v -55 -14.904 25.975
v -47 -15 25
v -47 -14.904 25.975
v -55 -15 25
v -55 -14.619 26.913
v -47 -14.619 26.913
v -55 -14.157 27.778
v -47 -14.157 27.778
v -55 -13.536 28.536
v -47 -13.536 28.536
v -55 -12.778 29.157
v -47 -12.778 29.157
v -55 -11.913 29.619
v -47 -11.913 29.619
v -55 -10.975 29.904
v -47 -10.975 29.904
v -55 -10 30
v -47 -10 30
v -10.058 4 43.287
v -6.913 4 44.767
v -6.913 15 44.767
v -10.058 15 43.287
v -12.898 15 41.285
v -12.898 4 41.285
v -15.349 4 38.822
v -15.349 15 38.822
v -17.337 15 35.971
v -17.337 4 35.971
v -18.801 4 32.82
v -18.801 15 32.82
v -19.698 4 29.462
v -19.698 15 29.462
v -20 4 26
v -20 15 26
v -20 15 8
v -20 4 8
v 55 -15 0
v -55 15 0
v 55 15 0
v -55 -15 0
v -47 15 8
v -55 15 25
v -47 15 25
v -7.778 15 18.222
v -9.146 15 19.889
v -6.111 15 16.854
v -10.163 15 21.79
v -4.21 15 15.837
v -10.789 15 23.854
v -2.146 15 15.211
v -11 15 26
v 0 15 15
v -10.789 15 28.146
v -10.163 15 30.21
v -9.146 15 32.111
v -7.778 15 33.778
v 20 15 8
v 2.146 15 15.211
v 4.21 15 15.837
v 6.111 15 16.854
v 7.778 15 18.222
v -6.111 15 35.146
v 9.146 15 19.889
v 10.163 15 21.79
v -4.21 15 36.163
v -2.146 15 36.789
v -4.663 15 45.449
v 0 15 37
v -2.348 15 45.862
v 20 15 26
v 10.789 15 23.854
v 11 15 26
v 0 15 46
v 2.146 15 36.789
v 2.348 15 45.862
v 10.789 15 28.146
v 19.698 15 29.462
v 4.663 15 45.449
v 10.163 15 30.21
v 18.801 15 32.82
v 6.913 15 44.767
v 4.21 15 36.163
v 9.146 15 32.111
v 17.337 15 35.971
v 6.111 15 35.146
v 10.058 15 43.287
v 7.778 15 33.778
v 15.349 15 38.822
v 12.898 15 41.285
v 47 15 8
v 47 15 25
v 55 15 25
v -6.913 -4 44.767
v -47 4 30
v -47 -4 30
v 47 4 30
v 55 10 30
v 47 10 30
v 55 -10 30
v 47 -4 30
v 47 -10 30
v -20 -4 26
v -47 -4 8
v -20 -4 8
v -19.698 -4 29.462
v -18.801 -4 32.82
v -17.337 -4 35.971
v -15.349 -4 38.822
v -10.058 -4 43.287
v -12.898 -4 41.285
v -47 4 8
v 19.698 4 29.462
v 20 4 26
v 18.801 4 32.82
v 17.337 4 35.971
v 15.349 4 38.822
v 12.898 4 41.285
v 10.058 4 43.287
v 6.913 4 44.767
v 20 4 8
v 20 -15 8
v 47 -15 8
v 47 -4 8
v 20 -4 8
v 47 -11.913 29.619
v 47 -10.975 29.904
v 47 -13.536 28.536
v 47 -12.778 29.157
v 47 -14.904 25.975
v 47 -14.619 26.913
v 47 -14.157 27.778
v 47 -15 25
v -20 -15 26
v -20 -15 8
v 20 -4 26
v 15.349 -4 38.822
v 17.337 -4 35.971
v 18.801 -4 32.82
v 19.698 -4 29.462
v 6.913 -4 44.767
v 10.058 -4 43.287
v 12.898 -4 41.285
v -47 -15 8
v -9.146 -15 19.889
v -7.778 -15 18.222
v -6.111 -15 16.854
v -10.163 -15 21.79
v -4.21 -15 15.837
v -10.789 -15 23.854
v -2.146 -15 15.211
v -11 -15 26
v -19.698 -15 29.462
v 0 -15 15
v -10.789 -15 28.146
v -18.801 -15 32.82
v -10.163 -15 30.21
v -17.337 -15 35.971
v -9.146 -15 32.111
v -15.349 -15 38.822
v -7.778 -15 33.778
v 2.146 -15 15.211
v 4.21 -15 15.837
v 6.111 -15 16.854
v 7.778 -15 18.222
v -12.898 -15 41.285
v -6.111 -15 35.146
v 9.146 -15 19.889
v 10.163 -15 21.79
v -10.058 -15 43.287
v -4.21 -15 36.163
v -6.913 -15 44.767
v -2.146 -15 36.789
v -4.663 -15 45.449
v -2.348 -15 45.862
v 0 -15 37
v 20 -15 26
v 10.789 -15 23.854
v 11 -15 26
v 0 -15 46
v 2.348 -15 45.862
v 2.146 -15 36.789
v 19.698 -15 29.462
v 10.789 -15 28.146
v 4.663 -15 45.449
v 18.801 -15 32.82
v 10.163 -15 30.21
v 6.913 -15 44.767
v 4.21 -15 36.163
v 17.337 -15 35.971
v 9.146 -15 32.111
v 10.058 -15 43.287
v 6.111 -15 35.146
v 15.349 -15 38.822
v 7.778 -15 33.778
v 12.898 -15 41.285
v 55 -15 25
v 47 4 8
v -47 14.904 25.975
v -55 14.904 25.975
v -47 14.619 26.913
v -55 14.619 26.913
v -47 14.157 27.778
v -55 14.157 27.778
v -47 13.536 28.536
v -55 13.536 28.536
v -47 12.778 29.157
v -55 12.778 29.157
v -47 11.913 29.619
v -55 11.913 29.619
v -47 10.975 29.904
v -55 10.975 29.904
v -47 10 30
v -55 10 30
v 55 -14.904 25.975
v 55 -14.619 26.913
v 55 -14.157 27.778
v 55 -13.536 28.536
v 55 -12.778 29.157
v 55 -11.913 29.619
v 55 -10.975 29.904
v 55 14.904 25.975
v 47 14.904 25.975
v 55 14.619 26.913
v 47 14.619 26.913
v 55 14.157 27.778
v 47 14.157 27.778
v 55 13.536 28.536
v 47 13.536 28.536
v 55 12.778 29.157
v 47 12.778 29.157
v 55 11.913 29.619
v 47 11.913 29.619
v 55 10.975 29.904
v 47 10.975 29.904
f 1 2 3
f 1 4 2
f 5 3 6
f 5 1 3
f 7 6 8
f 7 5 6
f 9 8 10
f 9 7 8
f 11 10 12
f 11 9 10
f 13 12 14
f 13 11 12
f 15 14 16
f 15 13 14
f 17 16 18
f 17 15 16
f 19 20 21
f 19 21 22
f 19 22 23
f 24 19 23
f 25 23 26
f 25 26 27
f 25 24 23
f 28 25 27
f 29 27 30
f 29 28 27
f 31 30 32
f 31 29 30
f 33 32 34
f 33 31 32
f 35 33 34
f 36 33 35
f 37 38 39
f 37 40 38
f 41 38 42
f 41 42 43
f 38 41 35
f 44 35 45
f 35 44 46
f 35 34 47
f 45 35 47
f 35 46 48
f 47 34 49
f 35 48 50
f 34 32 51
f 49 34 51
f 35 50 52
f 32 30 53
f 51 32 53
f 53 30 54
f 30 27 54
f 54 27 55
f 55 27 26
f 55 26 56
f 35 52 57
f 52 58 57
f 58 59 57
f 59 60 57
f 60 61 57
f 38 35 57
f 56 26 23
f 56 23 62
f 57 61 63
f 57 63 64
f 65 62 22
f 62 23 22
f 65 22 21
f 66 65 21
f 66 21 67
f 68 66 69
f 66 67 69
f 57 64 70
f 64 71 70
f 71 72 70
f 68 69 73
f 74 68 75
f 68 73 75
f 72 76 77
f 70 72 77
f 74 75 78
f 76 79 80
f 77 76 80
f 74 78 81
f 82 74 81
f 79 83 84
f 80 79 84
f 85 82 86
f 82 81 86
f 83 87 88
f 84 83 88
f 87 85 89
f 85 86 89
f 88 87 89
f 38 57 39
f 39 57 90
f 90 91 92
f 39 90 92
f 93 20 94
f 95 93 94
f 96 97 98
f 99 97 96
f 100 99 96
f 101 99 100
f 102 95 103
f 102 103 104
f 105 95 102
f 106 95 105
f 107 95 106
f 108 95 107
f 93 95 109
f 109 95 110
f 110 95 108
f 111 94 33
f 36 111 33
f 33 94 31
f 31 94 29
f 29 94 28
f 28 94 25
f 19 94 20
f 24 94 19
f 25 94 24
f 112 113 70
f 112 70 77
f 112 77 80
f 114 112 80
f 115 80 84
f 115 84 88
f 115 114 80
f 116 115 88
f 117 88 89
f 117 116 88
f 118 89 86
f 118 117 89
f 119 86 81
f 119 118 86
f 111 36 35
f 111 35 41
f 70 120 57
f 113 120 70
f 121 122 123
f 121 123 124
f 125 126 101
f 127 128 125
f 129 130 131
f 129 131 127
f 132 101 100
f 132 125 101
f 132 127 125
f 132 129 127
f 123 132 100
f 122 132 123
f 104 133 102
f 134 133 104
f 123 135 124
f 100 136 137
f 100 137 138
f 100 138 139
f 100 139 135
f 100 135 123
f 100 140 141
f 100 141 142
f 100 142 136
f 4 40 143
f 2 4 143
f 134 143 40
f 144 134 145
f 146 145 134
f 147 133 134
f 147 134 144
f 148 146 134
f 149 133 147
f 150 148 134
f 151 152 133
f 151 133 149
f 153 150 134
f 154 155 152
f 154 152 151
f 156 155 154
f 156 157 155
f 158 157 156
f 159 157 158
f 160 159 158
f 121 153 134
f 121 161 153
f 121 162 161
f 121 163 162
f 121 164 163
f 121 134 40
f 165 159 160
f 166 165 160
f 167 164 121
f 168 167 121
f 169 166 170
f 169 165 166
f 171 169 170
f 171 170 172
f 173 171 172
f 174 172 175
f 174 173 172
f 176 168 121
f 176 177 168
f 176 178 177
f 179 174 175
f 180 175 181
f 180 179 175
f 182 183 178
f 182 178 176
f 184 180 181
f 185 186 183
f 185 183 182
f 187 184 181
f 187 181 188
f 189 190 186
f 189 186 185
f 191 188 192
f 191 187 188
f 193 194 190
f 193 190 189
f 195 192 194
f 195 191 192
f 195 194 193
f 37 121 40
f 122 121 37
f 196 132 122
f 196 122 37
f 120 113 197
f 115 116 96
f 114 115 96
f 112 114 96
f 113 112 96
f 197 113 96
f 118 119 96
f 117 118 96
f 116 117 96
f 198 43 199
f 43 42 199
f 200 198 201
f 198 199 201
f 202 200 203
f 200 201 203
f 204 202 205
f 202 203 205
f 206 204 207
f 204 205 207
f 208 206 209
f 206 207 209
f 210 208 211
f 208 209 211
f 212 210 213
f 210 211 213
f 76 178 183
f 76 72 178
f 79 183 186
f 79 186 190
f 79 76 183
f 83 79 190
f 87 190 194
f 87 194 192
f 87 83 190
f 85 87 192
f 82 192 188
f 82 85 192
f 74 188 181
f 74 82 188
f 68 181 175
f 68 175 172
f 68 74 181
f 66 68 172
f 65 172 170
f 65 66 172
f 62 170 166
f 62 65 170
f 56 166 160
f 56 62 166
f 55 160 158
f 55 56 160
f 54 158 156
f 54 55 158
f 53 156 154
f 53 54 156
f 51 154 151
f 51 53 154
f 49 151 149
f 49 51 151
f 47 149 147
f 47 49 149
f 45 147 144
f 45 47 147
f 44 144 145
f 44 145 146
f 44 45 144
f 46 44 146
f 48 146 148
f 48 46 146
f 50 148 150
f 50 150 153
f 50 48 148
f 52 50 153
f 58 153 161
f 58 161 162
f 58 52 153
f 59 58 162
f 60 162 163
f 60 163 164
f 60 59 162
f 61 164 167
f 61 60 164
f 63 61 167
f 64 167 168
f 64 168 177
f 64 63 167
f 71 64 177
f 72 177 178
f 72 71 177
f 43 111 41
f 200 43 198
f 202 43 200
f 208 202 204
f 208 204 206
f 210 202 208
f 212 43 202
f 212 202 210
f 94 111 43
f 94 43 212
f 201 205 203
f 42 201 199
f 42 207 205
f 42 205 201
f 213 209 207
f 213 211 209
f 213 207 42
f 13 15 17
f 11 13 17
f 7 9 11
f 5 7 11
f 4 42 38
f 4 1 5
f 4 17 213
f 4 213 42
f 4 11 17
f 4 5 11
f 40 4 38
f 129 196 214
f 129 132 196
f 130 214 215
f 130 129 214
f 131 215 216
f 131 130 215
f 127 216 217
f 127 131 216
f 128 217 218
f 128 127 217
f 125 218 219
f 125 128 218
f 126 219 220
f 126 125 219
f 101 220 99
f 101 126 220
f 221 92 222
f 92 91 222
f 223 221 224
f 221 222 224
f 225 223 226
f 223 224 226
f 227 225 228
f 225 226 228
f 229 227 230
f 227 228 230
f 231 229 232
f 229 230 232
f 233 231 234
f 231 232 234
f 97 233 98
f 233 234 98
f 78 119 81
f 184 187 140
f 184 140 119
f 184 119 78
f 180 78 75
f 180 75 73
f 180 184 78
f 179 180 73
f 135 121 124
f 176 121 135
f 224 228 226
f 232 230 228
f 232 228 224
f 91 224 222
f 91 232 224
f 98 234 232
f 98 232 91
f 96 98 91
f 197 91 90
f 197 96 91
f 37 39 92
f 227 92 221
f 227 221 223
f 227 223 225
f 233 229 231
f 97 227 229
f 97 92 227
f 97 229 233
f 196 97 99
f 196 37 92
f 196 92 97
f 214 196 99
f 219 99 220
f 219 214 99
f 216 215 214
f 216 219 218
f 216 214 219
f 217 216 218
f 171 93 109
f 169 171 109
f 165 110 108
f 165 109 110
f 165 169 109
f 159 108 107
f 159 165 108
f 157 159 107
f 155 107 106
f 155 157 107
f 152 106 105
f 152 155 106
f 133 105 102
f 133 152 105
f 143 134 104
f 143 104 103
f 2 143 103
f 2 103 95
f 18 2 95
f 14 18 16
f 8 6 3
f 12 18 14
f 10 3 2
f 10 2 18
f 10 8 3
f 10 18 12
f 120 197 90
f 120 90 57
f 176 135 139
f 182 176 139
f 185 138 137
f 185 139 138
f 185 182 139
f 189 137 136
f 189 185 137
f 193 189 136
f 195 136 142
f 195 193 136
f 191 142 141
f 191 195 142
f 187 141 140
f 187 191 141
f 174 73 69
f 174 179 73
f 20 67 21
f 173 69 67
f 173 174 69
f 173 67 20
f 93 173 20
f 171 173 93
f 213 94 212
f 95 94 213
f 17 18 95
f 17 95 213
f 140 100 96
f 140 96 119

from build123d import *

# Parameters (mm, degrees)
F0_R     = 11
F1_DEPTH = 15
F2_DEPTH = 4
F3_R     = 5


with BuildPart() as f1:
    # F0 (on Front) → F1 (new body, symmetric)
    with BuildSketch(Plane.XZ):
        with BuildLine():
            Line((-55, 0), (0, 0))
            Line((0, 0), (55, 0))
            Line((55, 0), (55, 30))
            Line((55, 30), (47, 30))
            Line((47, 30), (47, 8))
            Line((47, 8), (20, 8))
            Line((20, 8), (20, 26))
            ThreePointArc((20, 26), (16.405315, 37.439651), (6.913438, 44.767109))
            ThreePointArc((6.913438, 44.767109), (3.511255, 45.689365), (0, 46))
            ThreePointArc((0, 46), (-3.511255, 45.689365), (-6.913438, 44.767109))
            ThreePointArc((-6.913438, 44.767109), (-16.405315, 37.439651), (-20, 26))
            Line((-20, 26), (-20, 8))
            Line((-20, 8), (-47, 8))
            Line((-47, 8), (-47, 30))
            Line((-47, 30), (-55, 30))
            Line((-55, 30), (-55, 0))
        make_face()
        with Locations((0, 26)):
            Circle(F0_R, mode=Mode.SUBTRACT)
    extrude(amount=F1_DEPTH, both=True)

    # F0 (on Front) → F2 (join, symmetric)
    with BuildSketch(Plane.XZ):
        with BuildLine():
            Line((-6.913438, 44.767109), (-47, 30))
            Line((-47, 30), (-47, 8))
            Line((-47, 8), (-20, 8))
            Line((-20, 8), (-20, 26))
            ThreePointArc((-20, 26), (-16.405315, 37.439651), (-6.913438, 44.767109))
        make_face()
        with BuildLine():
            Line((47, 8), (47, 30))
            Line((47, 30), (6.913438, 44.767109))
            ThreePointArc((6.913438, 44.767109), (16.405315, 37.439651), (20, 26))
            Line((20, 26), (20, 8))
            Line((20, 8), (47, 8))
        make_face()
    extrude(amount=F2_DEPTH, both=True)

    # F3
    f3_edges = [f1.edges().sort_by_distance(p)[0] for p in [
        (51, -15, 30),
        (-51, -15, 30),
        (-51, 15, 30),
        (51, 15, 30),
    ]]
    fillet(f3_edges, radius=F3_R)


solid = f1.part
